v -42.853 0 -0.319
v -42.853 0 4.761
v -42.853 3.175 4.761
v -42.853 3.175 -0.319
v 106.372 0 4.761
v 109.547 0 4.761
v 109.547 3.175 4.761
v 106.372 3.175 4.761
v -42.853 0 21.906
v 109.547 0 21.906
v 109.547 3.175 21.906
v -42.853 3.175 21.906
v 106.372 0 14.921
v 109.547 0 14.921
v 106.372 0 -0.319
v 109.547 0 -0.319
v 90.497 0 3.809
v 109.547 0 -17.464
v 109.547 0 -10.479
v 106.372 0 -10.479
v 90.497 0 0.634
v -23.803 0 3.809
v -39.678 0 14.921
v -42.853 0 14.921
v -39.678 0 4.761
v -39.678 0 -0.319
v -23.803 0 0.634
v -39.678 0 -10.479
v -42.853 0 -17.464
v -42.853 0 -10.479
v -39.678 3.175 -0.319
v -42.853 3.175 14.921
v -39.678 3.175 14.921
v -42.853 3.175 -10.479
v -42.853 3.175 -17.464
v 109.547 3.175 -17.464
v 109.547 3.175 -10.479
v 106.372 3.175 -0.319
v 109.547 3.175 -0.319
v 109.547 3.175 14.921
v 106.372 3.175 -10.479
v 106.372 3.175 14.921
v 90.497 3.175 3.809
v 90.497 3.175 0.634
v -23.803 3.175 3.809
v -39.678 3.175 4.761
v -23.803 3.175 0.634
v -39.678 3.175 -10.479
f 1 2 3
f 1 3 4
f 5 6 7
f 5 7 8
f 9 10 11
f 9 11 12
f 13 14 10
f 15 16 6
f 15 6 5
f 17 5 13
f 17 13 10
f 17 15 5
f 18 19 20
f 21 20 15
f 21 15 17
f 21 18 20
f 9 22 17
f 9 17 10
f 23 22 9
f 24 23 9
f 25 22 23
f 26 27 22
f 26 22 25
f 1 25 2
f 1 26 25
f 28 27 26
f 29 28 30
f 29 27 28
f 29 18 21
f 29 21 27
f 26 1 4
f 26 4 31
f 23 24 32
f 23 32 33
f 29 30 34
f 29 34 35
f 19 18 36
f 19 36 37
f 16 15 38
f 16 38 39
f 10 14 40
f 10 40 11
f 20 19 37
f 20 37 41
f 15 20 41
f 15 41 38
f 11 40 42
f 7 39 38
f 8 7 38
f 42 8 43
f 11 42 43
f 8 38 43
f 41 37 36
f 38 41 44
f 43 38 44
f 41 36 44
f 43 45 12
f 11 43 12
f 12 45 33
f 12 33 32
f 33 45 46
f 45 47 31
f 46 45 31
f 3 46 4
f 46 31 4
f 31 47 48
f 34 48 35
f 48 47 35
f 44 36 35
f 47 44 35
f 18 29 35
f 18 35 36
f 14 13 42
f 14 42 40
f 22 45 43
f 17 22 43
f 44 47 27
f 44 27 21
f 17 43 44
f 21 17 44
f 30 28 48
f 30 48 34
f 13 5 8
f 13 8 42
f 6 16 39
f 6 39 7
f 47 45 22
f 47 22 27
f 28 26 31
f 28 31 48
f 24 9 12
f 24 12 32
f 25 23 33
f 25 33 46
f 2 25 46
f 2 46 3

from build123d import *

# Parameters (mm, degrees)
BOSS_EXTRUDE1_DEPTH = 3.175
SKETCH2_W           = 114.3
SKETCH2_H           = 3.175
CUT_EXTRUDE1_DEPTH  = 4.175


with BuildPart() as part:
    # Sketch1 → Boss-Extrude1 (new body)
    with BuildSketch(Plane(origin=(0, 0, 0), x_dir=(1, 0, 0), z_dir=(0, 1, 0))):
        Polygon((-42.852622222, 17.463911111), (109.547377778, 17.463911111), (109.547377778, 10.478911111), (106.372377778, 10.478911111), (106.372377778, 0.318911111), (109.547377778, 0.318911111), (109.547377778, -4.761088889), (106.372377778, -4.761088889), (106.372377778, -14.921088889), (109.547377778, -14.921088889), (109.547377778, -21.906088889), (-42.852622222, -21.906088889), (-42.852622222, -14.921088889), (-39.677622222, -14.921088889), (-39.677622222, -4.761088889), (-42.852622222, -4.761088889), (-42.852622222, 0.318911111), (-39.677622222, 0.318911111), (-39.677622222, 10.478911111), (-42.852622222, 10.478911111), align=None)
    extrude(amount=BOSS_EXTRUDE1_DEPTH)

    # Sketch2 → Cut-Extrude1 (cut, through all)
    with BuildSketch(Plane(origin=(0, 3.175, 0), x_dir=(1, 0, 0), z_dir=(0, 1, 0))):
        with Locations((33.347377778, -2.221088889)):
            Rectangle(SKETCH2_W, SKETCH2_H)
    extrude(amount=-CUT_EXTRUDE1_DEPTH, mode=Mode.SUBTRACT)


solid = part.part
